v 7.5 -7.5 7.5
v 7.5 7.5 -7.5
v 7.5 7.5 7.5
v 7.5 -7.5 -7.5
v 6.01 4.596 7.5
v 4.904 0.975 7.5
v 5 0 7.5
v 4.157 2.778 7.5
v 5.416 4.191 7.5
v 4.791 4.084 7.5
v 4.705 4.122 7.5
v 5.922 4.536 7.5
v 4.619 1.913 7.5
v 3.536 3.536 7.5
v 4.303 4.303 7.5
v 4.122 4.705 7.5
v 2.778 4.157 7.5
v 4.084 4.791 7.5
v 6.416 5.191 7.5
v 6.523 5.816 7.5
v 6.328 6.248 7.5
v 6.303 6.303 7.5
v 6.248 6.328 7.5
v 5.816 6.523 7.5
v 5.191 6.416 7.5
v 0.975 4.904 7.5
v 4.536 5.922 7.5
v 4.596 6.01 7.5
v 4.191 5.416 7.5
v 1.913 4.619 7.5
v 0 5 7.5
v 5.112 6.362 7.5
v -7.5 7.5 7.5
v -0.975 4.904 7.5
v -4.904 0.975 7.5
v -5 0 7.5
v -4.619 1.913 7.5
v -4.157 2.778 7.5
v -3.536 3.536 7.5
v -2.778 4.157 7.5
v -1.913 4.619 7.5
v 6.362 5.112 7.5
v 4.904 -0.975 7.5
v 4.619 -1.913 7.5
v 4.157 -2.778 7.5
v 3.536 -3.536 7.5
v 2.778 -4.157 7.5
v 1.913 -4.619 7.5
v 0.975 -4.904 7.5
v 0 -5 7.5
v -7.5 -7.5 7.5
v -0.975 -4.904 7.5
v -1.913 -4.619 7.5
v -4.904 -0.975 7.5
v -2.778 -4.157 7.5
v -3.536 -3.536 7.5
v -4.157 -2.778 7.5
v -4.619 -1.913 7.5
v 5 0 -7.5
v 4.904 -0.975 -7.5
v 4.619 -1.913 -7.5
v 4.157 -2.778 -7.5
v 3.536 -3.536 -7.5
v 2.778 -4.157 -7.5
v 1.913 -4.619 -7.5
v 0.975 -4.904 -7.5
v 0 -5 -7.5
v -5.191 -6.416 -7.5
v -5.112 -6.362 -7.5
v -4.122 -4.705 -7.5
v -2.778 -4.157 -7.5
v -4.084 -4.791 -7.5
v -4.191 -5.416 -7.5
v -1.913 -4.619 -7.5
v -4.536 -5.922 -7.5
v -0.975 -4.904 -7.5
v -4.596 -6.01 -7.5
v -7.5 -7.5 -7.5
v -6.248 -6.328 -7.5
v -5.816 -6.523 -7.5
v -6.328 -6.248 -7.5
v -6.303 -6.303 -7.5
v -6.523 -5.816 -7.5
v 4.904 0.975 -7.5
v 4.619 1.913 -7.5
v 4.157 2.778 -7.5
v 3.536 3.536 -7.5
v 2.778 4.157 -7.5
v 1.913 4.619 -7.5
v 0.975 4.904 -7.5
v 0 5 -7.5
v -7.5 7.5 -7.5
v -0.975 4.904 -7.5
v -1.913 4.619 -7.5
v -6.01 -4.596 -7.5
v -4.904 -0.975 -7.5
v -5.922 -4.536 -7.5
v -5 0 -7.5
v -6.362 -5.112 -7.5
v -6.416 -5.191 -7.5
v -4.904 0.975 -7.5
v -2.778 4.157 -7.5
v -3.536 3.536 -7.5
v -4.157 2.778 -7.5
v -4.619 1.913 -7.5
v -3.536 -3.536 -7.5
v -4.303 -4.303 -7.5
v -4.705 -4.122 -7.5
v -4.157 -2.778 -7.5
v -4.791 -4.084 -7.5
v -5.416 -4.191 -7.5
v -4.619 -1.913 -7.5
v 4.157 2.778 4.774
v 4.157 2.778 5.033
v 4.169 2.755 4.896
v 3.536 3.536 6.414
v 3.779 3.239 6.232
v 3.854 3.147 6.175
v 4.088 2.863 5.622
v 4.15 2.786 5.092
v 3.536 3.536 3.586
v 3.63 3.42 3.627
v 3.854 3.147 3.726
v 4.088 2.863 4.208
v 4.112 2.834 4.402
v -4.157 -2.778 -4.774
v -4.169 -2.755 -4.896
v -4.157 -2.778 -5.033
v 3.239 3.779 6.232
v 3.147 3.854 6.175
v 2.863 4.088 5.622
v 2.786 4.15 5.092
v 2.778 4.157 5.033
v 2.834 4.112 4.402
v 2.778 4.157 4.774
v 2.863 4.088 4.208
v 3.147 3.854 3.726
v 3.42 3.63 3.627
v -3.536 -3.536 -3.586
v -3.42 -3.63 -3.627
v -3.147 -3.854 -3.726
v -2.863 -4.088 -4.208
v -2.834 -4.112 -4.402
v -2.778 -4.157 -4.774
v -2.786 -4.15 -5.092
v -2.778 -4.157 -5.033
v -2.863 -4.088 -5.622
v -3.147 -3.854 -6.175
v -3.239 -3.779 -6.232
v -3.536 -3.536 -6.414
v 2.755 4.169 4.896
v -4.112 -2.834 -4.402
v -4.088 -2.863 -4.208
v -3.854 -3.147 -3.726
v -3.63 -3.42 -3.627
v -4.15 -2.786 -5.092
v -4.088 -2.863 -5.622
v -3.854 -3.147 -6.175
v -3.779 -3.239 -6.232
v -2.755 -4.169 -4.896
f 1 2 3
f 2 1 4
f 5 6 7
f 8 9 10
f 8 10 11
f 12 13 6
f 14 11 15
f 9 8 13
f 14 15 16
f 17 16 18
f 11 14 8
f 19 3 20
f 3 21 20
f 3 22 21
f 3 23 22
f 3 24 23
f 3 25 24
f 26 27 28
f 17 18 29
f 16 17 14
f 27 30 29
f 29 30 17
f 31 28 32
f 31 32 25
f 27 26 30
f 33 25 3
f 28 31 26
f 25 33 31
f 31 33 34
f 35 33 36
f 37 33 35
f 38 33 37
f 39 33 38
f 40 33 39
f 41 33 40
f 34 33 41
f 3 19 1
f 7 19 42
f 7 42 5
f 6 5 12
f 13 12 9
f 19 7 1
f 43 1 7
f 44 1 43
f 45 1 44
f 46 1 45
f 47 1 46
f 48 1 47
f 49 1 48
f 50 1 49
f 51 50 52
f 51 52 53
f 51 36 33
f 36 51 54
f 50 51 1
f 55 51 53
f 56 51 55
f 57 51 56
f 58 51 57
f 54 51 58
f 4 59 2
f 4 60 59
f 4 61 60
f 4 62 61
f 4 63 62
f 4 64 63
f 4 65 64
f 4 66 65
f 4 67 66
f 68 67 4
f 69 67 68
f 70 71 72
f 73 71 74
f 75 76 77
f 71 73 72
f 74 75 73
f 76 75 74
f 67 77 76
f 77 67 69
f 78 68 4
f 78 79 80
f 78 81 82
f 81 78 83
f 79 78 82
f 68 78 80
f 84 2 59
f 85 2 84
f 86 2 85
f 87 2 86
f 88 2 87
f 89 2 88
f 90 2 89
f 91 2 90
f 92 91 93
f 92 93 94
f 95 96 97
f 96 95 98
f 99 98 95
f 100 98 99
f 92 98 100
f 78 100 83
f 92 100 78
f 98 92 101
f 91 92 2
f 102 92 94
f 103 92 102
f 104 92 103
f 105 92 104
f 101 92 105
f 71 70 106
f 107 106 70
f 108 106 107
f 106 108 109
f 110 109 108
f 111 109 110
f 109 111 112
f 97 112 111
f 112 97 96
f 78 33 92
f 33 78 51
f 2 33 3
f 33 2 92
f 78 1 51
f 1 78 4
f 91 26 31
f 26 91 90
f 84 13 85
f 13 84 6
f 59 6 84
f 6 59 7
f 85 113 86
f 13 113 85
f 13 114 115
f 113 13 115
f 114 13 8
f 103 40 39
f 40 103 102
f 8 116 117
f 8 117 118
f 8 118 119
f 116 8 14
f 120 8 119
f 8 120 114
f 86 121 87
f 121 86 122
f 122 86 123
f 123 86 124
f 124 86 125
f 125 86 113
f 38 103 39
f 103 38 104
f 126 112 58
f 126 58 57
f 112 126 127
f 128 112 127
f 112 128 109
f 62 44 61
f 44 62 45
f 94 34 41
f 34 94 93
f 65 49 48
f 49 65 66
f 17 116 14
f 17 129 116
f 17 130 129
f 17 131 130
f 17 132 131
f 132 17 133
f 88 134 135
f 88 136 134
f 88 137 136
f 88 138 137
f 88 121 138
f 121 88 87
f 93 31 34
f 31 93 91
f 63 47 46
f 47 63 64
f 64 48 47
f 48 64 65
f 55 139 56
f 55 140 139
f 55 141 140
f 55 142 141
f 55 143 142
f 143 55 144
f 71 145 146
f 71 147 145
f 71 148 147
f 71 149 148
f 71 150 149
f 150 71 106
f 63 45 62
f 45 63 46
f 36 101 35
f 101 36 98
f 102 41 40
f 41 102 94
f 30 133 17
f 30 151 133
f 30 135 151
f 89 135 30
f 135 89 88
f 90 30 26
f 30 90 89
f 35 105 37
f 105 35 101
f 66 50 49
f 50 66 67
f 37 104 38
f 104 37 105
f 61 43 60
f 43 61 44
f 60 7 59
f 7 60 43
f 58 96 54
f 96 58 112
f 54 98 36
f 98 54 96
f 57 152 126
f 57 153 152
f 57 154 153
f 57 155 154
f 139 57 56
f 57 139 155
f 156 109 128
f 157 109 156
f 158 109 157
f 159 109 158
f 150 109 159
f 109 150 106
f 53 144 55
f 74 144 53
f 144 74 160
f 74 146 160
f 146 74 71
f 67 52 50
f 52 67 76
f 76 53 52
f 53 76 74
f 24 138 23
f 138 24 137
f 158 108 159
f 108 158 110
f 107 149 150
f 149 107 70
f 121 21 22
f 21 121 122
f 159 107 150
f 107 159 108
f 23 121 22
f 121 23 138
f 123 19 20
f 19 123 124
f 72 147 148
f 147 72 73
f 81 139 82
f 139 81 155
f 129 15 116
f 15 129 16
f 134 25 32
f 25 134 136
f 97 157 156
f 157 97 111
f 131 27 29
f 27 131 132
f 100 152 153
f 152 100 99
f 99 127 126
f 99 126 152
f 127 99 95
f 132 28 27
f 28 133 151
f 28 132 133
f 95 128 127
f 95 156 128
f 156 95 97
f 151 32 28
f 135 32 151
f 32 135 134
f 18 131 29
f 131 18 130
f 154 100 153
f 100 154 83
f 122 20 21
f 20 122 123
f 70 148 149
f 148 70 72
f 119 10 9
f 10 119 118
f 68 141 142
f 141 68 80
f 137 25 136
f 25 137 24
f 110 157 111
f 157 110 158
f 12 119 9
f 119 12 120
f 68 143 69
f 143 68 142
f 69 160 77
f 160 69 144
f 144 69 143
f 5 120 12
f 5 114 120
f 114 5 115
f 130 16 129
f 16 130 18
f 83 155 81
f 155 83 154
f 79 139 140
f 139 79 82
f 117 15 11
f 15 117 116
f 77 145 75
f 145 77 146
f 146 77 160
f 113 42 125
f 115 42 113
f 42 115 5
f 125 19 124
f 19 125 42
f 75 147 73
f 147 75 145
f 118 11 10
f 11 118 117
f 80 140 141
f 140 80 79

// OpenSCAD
difference() {
    cube(15, center=true);
    cylinder(16, r=5, $fn=32, center=true);
    rotate([0, 45, 45]) {
        cylinder(30, r=1, $fn=12, center=true);
    }
}
